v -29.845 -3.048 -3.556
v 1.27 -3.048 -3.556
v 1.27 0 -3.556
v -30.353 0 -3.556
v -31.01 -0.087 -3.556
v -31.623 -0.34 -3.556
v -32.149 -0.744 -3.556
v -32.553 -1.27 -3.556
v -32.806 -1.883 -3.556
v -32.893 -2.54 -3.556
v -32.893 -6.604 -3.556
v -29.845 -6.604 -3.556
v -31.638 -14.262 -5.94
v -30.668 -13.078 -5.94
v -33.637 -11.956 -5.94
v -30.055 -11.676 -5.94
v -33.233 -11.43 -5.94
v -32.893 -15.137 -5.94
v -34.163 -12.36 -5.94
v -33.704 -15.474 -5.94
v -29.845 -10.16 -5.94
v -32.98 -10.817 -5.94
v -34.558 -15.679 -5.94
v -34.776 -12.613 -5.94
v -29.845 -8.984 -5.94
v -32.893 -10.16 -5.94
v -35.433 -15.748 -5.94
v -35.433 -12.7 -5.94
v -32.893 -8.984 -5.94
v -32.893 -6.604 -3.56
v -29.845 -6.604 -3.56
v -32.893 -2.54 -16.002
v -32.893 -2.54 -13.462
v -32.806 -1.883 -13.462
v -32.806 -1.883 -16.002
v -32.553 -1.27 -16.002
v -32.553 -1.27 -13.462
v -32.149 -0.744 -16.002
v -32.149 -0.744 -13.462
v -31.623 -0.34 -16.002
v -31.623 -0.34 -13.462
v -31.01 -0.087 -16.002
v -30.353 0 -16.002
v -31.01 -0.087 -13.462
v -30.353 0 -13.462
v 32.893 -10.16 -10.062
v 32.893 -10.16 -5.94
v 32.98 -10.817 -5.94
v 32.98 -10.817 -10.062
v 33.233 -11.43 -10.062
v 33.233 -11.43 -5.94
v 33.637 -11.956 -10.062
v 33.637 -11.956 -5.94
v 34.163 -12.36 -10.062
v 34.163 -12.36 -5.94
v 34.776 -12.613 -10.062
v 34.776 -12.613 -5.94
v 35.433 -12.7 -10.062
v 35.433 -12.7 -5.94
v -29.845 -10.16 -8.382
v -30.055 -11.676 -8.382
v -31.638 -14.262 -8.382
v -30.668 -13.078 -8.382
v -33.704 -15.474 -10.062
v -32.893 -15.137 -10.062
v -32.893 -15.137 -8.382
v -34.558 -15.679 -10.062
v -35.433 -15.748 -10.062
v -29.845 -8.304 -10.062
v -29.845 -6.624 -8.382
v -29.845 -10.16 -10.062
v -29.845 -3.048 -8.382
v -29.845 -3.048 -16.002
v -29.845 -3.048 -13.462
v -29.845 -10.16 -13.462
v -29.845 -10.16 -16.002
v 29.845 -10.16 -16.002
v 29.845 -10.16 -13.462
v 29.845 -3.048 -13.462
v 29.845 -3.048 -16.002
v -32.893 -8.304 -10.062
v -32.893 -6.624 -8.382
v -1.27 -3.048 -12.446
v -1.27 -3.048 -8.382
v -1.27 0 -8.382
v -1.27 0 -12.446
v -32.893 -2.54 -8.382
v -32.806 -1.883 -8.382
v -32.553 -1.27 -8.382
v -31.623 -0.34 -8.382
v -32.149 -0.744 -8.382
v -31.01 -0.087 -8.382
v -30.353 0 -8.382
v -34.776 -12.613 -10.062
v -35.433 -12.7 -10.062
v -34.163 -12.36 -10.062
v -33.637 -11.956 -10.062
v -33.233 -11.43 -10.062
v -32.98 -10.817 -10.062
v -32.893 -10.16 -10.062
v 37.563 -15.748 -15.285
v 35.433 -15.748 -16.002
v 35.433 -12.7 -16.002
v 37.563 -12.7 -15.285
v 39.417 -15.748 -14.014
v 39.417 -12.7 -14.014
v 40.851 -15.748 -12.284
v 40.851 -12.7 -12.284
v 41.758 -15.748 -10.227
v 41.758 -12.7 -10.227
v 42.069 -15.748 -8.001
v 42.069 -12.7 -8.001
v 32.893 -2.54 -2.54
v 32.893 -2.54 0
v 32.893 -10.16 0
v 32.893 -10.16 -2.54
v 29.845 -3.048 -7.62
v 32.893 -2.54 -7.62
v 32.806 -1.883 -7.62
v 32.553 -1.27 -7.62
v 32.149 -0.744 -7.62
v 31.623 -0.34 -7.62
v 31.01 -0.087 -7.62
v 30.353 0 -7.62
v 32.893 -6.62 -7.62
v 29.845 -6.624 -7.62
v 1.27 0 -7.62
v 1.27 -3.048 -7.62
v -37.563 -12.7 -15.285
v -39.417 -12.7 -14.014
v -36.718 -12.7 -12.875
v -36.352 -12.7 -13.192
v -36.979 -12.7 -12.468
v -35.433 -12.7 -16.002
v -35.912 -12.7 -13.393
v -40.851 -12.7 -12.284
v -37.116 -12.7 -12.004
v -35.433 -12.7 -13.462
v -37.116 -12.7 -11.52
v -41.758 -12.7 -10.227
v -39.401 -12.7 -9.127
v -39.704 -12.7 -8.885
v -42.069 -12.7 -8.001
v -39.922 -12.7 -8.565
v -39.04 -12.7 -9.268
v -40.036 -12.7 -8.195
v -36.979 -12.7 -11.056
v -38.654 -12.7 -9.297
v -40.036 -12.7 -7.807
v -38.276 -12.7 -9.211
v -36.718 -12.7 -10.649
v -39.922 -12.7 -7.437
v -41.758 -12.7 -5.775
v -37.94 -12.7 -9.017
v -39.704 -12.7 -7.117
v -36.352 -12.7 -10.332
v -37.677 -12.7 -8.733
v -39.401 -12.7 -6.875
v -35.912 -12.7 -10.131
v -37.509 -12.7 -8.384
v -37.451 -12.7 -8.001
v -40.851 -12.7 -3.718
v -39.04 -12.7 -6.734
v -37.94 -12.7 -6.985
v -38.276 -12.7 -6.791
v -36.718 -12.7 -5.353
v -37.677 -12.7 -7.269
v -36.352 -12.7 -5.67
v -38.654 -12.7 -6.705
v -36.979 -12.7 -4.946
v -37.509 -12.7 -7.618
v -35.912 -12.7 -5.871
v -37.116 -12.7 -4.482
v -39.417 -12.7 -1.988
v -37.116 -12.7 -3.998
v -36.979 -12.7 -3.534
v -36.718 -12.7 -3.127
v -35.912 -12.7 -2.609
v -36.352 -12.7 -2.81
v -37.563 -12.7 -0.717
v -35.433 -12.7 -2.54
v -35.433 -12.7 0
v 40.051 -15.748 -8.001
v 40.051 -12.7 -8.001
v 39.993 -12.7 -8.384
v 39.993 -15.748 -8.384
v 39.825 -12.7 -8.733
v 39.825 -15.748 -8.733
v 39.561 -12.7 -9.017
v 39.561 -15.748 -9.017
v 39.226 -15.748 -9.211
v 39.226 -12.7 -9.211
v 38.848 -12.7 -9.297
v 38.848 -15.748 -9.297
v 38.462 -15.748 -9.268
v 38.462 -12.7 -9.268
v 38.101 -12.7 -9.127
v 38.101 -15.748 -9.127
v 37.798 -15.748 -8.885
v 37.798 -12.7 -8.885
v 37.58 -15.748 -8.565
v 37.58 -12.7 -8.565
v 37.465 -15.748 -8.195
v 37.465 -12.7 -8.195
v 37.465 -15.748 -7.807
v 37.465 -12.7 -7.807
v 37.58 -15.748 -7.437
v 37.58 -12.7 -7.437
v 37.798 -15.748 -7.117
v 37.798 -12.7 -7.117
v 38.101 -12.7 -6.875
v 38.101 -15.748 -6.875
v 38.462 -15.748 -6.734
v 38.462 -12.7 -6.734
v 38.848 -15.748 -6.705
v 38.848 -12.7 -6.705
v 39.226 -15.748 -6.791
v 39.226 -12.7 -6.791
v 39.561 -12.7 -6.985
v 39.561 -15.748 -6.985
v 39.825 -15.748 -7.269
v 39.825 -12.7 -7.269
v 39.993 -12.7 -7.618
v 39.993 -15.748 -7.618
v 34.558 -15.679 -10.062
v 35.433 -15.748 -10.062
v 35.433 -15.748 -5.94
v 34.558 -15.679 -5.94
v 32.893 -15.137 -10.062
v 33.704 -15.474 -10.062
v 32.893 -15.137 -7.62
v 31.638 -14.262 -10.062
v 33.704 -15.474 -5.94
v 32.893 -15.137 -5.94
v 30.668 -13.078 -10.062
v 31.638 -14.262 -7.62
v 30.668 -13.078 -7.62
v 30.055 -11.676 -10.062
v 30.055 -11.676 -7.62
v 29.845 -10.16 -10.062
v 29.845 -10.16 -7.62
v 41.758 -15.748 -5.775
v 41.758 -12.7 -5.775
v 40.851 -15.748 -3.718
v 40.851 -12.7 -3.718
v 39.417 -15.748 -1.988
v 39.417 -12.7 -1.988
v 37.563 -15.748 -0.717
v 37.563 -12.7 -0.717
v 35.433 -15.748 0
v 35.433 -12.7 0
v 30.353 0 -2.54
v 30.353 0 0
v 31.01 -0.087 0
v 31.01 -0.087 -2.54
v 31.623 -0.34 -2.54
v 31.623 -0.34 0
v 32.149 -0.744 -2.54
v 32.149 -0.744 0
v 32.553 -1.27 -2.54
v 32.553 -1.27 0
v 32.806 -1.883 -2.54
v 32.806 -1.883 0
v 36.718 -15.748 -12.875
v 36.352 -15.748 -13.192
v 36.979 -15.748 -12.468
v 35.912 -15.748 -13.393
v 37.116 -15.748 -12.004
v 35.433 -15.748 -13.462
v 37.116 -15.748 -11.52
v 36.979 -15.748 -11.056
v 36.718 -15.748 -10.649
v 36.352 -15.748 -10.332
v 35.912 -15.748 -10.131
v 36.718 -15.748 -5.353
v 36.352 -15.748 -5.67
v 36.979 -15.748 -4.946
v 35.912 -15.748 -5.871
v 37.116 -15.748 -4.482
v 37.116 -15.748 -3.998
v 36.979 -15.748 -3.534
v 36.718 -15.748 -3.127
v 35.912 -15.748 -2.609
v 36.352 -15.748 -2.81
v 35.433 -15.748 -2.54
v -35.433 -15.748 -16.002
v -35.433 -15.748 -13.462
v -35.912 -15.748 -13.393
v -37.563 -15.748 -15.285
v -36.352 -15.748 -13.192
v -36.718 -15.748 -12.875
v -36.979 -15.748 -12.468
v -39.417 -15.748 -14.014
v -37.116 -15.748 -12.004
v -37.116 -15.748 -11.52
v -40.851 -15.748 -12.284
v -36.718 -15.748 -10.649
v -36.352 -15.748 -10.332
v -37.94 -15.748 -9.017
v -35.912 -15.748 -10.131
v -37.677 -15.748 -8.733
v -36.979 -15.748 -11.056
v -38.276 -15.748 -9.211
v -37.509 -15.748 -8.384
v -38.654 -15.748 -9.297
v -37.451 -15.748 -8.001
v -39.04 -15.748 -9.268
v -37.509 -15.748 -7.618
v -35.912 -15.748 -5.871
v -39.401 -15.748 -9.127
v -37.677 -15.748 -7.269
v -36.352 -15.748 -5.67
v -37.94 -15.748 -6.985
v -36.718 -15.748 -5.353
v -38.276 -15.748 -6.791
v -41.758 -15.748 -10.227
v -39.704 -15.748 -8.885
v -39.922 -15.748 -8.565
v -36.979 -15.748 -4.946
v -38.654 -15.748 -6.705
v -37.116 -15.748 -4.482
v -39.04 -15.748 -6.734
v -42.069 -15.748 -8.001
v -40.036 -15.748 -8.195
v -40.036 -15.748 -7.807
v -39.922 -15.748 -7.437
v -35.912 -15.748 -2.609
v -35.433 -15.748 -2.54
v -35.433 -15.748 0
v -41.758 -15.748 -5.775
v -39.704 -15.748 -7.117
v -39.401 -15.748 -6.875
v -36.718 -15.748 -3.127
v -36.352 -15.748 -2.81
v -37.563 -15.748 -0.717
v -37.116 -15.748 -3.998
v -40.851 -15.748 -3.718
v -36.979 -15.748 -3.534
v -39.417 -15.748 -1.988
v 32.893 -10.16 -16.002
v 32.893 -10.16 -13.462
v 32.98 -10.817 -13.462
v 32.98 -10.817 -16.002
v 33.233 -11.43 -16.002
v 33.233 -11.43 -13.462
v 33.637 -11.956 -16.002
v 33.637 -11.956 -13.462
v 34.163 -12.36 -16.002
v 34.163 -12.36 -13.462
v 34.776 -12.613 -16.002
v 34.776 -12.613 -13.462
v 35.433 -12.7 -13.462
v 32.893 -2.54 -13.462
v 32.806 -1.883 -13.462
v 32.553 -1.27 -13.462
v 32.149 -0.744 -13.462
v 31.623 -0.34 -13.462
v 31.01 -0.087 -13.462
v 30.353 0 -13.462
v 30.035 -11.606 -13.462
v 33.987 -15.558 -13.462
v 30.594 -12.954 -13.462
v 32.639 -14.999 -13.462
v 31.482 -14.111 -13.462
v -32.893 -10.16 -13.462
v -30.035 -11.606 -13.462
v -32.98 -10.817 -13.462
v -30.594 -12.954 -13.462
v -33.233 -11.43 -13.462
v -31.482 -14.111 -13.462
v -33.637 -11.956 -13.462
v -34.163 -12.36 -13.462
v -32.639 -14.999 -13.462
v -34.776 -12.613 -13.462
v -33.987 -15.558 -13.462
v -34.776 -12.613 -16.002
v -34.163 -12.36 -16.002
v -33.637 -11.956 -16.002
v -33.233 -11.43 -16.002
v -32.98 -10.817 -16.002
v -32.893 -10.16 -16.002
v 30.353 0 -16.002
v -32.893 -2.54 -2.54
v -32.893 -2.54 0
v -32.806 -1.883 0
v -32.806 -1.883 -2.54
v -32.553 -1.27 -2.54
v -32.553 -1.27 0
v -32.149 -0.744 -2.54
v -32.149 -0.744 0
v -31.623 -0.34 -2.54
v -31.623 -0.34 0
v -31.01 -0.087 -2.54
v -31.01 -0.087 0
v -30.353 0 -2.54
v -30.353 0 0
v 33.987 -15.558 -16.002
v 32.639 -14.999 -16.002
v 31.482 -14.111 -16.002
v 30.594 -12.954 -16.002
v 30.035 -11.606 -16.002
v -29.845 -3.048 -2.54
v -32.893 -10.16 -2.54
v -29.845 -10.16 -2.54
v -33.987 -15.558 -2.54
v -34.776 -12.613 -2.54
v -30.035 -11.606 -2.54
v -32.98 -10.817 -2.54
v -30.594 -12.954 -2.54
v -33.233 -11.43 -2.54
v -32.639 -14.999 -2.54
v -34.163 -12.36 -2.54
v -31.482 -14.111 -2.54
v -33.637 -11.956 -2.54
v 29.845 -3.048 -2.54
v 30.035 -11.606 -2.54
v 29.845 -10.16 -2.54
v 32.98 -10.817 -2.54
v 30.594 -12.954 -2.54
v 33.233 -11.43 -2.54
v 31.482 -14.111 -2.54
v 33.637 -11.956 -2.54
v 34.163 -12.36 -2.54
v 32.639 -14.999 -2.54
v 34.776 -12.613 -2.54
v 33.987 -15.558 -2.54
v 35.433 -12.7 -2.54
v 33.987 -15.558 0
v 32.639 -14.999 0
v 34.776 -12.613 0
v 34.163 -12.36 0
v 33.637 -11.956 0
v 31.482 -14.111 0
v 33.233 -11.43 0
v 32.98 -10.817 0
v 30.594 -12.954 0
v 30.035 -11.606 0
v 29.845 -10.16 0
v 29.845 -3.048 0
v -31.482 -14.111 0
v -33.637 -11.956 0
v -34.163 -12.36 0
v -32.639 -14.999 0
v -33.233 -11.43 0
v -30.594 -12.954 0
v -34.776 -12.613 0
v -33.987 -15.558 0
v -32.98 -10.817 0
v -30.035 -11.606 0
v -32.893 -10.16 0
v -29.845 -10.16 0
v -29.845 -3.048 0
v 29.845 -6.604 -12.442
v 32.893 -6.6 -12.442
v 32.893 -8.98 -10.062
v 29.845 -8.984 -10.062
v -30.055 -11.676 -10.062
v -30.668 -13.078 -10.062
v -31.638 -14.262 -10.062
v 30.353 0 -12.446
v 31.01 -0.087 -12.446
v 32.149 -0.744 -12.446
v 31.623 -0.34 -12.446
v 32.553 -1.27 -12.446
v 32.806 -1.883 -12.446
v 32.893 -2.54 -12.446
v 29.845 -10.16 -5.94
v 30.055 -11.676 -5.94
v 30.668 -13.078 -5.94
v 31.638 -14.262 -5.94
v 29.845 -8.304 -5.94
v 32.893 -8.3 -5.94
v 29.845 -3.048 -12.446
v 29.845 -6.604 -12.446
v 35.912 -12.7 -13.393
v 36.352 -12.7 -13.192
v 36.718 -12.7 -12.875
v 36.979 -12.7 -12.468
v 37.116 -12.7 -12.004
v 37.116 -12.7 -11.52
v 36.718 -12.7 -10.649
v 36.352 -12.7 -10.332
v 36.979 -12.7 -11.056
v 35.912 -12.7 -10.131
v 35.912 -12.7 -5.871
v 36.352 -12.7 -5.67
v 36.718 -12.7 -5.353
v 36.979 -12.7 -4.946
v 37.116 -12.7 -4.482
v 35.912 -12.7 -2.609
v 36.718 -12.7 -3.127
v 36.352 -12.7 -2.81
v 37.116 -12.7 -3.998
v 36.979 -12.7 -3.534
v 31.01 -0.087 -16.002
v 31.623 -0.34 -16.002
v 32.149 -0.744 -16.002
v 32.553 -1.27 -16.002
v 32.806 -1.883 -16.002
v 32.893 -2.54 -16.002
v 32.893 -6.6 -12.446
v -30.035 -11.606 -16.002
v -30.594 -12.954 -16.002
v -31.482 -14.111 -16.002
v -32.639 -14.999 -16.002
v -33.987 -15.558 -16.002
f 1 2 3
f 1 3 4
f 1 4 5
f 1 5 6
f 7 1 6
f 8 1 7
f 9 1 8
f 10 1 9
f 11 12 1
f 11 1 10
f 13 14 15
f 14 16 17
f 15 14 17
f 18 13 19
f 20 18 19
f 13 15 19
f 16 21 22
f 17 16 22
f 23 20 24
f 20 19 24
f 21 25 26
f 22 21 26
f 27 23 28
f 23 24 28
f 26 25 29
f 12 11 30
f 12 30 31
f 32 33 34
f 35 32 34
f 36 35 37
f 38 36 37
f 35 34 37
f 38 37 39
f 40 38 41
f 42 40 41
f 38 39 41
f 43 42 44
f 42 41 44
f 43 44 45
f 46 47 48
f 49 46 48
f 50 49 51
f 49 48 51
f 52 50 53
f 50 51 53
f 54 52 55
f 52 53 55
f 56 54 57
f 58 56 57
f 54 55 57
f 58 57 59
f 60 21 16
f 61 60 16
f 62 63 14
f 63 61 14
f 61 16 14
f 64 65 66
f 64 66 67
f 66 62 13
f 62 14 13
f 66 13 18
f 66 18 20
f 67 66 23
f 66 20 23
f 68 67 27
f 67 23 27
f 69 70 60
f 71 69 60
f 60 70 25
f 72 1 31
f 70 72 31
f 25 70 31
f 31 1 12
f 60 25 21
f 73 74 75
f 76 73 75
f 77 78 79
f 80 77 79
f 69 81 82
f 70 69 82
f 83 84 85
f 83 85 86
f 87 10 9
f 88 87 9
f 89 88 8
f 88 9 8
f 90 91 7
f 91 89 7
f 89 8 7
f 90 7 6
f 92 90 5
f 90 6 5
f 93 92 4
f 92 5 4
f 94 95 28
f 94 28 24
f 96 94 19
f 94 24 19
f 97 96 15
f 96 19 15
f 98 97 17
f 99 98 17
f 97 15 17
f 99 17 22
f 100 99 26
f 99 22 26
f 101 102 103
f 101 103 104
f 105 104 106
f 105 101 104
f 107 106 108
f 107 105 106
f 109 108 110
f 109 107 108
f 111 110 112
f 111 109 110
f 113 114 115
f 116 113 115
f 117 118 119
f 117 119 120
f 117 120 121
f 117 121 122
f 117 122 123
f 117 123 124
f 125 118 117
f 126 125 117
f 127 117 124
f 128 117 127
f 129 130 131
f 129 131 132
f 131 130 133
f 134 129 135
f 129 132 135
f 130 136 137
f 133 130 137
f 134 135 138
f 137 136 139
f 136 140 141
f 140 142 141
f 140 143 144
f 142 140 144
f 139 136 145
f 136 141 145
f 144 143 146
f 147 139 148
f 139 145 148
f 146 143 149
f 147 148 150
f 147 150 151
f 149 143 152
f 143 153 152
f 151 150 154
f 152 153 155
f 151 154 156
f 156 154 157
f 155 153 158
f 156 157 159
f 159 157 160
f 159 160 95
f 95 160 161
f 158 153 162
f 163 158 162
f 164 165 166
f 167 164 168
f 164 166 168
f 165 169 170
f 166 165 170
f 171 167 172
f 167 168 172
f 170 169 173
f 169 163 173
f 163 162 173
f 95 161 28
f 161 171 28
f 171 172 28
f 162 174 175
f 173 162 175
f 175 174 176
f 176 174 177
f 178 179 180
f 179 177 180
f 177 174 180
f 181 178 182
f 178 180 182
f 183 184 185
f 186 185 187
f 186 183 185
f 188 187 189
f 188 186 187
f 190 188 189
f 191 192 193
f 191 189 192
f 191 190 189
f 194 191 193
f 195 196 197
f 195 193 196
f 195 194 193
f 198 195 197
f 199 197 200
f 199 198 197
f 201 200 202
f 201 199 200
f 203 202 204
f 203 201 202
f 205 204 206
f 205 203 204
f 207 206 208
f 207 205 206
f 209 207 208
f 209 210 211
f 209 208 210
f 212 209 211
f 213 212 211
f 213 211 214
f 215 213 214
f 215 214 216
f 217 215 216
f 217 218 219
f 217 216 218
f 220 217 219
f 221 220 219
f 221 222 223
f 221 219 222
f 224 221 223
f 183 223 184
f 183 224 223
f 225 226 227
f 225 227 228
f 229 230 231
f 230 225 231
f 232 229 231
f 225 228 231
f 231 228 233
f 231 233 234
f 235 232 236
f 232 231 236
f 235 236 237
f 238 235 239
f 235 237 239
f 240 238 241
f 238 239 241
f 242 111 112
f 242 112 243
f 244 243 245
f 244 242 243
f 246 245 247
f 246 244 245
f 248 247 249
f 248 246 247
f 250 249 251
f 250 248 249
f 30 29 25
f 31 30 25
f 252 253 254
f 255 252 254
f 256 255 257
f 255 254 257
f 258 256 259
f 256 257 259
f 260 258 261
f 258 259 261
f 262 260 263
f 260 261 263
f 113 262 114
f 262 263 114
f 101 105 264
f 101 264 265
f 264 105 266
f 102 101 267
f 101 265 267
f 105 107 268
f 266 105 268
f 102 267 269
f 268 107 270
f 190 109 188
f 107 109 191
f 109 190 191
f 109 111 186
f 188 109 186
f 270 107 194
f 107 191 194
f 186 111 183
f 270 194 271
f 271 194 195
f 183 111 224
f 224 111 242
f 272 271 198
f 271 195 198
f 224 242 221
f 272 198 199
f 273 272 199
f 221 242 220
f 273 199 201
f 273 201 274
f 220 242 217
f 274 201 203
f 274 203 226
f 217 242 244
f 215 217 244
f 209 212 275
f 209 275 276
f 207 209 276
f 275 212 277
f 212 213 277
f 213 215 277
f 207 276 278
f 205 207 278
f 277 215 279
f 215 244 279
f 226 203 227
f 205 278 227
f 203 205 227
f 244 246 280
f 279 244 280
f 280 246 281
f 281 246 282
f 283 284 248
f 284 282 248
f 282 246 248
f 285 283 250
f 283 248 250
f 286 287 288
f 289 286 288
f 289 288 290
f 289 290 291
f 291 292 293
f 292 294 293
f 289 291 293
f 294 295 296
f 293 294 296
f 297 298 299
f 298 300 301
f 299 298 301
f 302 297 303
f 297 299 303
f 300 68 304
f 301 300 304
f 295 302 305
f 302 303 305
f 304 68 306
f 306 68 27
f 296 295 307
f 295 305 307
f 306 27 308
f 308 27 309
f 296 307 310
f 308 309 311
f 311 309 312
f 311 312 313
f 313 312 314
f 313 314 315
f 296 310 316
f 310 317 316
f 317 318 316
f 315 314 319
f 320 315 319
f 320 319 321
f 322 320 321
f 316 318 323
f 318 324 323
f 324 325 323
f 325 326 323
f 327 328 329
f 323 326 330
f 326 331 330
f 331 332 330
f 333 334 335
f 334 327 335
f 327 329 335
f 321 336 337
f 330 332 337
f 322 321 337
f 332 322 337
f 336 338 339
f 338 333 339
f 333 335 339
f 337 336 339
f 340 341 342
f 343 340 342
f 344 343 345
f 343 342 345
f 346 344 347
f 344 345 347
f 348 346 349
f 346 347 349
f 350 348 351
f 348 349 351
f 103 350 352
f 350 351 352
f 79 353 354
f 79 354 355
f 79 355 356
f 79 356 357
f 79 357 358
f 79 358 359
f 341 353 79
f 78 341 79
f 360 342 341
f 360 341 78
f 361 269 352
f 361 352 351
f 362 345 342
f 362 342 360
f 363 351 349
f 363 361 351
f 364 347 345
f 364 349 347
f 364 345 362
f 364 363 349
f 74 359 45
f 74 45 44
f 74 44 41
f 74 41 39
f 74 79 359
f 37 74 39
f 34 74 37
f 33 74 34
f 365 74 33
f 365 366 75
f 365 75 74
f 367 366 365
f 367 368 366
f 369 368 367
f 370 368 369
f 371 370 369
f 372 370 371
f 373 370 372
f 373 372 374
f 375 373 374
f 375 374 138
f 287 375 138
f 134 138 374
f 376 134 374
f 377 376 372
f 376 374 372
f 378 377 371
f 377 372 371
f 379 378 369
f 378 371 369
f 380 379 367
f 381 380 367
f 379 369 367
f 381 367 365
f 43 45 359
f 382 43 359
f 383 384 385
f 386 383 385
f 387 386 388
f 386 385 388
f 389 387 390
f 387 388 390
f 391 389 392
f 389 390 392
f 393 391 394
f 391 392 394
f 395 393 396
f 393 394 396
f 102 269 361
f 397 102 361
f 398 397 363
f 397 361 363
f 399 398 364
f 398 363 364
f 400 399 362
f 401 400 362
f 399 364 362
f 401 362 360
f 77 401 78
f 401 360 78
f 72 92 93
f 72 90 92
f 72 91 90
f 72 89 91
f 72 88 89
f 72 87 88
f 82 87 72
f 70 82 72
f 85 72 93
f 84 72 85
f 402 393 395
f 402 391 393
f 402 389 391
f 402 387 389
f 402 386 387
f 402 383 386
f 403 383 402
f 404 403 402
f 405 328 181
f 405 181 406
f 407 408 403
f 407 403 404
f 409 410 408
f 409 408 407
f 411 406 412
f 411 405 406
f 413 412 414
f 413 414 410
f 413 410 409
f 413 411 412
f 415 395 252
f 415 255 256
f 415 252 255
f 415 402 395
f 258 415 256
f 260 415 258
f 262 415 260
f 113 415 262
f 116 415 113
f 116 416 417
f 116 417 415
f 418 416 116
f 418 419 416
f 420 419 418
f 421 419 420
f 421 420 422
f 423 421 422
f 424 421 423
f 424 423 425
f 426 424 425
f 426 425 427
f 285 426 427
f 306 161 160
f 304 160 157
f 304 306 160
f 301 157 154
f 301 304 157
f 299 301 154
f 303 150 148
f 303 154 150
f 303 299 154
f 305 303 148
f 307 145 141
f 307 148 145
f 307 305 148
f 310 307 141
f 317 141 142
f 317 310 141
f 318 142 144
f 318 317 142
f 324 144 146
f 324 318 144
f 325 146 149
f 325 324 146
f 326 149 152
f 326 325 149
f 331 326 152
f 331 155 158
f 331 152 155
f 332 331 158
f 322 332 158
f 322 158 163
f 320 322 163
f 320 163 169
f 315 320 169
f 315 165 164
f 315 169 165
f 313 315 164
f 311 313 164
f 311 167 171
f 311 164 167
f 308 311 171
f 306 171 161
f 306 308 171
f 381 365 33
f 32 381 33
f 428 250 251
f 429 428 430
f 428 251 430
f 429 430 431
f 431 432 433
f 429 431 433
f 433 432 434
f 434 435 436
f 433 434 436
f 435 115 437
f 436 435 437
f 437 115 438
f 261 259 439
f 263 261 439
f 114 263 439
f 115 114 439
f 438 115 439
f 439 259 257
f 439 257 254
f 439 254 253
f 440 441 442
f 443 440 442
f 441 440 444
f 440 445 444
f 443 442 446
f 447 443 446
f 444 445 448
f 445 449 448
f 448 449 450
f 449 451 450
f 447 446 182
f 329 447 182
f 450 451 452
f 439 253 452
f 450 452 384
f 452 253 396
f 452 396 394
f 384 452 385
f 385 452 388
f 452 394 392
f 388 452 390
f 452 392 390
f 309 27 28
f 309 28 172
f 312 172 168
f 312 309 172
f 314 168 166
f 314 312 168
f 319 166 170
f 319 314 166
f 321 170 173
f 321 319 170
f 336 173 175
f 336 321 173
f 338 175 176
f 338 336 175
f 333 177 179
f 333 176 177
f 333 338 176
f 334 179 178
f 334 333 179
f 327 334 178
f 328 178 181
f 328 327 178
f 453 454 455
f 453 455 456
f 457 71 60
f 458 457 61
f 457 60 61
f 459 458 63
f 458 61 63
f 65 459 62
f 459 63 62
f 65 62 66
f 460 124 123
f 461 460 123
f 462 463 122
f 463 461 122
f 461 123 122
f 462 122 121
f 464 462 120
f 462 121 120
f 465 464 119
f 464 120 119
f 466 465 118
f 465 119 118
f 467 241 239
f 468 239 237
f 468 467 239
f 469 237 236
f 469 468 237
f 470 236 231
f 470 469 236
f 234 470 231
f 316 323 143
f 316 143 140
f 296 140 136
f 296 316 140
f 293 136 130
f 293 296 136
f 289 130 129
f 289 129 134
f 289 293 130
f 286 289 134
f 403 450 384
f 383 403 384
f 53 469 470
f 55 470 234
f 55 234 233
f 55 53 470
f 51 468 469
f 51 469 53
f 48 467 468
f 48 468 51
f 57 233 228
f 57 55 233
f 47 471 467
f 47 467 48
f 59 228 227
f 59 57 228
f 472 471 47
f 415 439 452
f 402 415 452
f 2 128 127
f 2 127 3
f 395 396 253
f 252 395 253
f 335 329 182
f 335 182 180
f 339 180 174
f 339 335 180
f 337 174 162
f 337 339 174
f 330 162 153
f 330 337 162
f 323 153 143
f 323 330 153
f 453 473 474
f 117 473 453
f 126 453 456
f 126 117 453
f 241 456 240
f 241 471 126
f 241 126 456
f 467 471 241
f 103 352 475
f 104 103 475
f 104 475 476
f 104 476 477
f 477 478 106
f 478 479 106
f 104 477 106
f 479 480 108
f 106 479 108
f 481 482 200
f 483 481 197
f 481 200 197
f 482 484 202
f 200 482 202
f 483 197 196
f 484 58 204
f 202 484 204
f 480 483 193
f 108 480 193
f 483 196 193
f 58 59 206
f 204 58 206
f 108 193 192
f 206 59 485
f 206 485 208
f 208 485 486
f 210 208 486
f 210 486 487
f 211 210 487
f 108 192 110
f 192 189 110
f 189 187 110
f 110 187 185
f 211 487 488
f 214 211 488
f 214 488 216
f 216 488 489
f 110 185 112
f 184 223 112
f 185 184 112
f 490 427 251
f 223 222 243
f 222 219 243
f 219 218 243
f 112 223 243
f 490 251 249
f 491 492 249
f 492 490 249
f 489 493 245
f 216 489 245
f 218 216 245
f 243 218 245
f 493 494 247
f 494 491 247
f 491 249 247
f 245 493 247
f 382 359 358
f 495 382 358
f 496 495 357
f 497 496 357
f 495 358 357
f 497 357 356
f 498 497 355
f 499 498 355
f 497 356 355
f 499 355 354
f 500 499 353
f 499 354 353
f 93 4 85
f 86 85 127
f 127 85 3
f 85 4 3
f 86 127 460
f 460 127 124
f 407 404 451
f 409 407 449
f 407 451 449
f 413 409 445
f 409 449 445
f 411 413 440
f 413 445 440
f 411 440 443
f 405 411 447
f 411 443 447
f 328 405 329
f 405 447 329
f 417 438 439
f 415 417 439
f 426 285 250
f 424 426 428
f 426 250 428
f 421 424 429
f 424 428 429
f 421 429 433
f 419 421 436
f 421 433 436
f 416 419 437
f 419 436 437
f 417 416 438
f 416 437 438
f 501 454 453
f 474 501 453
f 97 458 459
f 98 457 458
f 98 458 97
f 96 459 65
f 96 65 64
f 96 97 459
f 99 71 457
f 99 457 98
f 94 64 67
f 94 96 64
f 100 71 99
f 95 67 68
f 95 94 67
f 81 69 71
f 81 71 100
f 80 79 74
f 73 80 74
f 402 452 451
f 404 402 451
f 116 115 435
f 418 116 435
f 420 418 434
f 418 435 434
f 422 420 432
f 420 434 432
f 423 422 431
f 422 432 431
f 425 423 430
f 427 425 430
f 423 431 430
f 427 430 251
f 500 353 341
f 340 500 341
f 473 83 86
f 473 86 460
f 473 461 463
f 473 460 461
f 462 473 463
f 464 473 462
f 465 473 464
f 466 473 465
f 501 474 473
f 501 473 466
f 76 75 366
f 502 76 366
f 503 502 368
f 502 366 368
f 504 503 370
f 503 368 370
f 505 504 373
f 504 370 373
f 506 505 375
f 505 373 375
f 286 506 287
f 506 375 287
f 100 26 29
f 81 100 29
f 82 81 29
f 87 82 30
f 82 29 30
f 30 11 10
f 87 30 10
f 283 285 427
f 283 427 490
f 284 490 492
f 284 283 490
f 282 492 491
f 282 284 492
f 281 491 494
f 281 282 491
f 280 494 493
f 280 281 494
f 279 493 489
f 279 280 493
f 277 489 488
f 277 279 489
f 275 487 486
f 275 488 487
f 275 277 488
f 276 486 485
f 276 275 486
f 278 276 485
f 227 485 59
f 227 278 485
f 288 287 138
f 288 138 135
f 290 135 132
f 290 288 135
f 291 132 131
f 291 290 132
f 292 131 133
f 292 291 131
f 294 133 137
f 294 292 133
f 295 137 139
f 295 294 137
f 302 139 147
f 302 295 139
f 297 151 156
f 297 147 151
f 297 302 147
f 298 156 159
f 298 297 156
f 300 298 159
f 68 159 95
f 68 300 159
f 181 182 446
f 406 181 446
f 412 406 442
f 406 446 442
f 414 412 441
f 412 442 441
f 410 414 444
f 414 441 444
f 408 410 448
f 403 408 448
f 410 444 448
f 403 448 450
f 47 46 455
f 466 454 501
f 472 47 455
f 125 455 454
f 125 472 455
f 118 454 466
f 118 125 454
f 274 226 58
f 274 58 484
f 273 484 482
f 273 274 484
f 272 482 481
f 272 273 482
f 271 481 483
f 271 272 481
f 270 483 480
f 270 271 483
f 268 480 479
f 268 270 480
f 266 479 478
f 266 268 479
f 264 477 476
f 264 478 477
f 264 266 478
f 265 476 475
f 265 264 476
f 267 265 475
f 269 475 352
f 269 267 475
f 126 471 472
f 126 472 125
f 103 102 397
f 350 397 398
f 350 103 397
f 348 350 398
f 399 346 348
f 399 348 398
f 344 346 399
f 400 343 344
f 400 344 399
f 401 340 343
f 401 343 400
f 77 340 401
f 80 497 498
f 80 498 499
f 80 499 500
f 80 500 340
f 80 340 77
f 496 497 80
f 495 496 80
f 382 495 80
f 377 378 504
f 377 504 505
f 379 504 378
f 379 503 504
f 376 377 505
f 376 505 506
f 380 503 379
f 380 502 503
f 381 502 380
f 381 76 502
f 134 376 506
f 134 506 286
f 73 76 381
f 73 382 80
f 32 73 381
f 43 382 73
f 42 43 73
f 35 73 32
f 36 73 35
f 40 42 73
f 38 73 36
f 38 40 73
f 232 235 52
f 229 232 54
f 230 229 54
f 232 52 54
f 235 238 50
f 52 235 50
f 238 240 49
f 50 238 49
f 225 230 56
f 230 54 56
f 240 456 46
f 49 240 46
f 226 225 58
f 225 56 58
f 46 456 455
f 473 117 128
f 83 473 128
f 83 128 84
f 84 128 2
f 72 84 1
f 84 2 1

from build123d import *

# Parameters (mm, degrees)
EXTRUDE_THIN1_DEPTH    = 16.002
CUT_EXTRUDE1_START     = -15.748
CUT_EXTRUDE1_OUTLINE_R = 1.3
CUT_EXTRUDE1_DEPTH     = 15.748
BOSS_EXTRUDE2_DEPTH    = 1.68
BOSS_EXTRUDE3_START    = 1.68
BOSS_EXTRUDE3_DEPTH    = 1.68
CUT_EXTRUDE2_START     = -2.384
CUT_EXTRUDE2_DEPTH     = 2.384
CUT_EXTRUDE3_DEPTH     = 2.384
CHAMFER1_SIZE          = 1.7
CHAMFER2_SIZE          = 2.38


# Read off the part's stored shape, not the designer's step: Cut-Extrude1
with BuildPart() as part:
    # Sketch1 → Extrude-Thin1 (new body)
    with BuildSketch(Plane.XY):
        with BuildLine():
            Line((-42.06875, -12.7), (-35.433, -12.7))
            ThreePointArc((-35.433, -12.7), (-33.636948776, -11.956051224), (-32.893, -10.16))
            Line((-32.893, -10.16), (-32.893, -2.54))
            ThreePointArc((-32.893, -2.54), (-32.149051224, -0.743948776), (-30.353, 0))
            Line((-30.353, 0), (30.353, 0))
            ThreePointArc((30.353, 0), (32.149051224, -0.743948776), (32.893, -2.54))
            Line((32.893, -2.54), (32.893, -10.16))
            ThreePointArc((32.893, -10.16), (33.636948776, -11.956051224), (35.433, -12.7))
            Line((35.433, -12.7), (42.06875, -12.7))
            Line((42.06875, -12.7), (42.06875, -15.748))
            Line((42.06875, -15.748), (35.433, -15.748))
            ThreePointArc((35.433, -15.748), (31.481687307, -14.111312693), (29.845, -10.16))
            Line((29.845, -10.16), (29.845, -3.048))
            Line((29.845, -3.048), (-29.845, -3.048))
            Line((-29.845, -3.048), (-29.845, -10.16))
            ThreePointArc((-29.845, -10.16), (-31.481687307, -14.111312693), (-35.433, -15.748))
            Line((-35.433, -15.748), (-42.06875, -15.748))
            Line((-42.06875, -15.748), (-42.06875, -12.7))
        make_face()
    extrude(amount=-EXTRUDE_THIN1_DEPTH)

    # Cut-Extrude1 outline → Cut-Extrude1 (cut)
    with BuildSketch(Plane(origin=(0, 0, 0), x_dir=(1, 0, 0), z_dir=(0, 1, 0)).offset(CUT_EXTRUDE1_START)):
        with BuildLine():
            Line((35.433, 13.462), (-35.433, 13.462))
            ThreePointArc((-35.433, 13.462), (-37.133, 11.762), (-35.433, 10.062))
            Line((-35.433, 10.062), (-32.893, 10.062))
            Line((-32.893, 10.062), (-32.893, 8.382))
            Line((-32.893, 8.382), (-1.27, 8.382))
            Line((-1.27, 8.382), (-1.27, 12.446))
            Line((-1.27, 12.446), (32.893, 12.446))
            Line((32.893, 12.446), (32.893, 10.062))
            Line((32.893, 10.062), (35.433, 10.062))
            ThreePointArc((35.433, 10.062), (37.133, 11.762), (35.433, 13.462))
        make_face()
        with BuildLine():
            Line((32.893, 5.94), (32.893, 7.62))
            Line((32.893, 7.62), (1.27, 7.62))
            Line((1.27, 7.62), (1.27, 3.556))
            Line((1.27, 3.556), (-32.893, 3.556))
            Line((-32.893, 3.556), (-32.893, 5.94))
            Line((-32.893, 5.94), (-35.433, 5.94))
            ThreePointArc((-35.433, 5.94), (-37.133, 4.24), (-35.433, 2.54))
            Line((-35.433, 2.54), (35.433, 2.54))
            ThreePointArc((35.433, 2.54), (37.133, 4.24), (35.433, 5.94))
            Line((35.433, 5.94), (32.893, 5.94))
        make_face()
        with BuildLine():
            Line((42.06875, 16.002), (35.433, 16.002))
            ThreePointArc((35.433, 16.002), (40.193949205, 13.198335352), (42.06875, 8.001))
            Line((42.06875, 8.001), (42.06875, 16.002))
        make_face()
        with BuildLine():
            Line((42.06875, 0), (42.06875, 8.001))
            ThreePointArc((42.06875, 8.001), (40.193949205, 2.803664648), (35.433, 0))
            Line((35.433, 0), (42.06875, 0))
        make_face()
        with BuildLine():
            ThreePointArc((-42.06875, 8.001), (-40.193949205, 13.198335352), (-35.433, 16.002))
            Line((-35.433, 16.002), (-42.06875, 16.002))
            Line((-42.06875, 16.002), (-42.06875, 8.001))
        make_face()
        with BuildLine():
            ThreePointArc((-35.433, 0), (-40.193949205, 2.803664648), (-42.06875, 8.001))
            Line((-42.06875, 8.001), (-42.06875, 0))
            Line((-42.06875, 0), (-35.433, 0))
        make_face()
        with Locations((38.750875, 8.001)):
            Circle(CUT_EXTRUDE1_OUTLINE_R)
        with Locations((-38.750875, 8.001)):
            Circle(CUT_EXTRUDE1_OUTLINE_R)
    extrude(amount=CUT_EXTRUDE1_DEPTH, mode=Mode.SUBTRACT)

    # Sketch6 → Boss-Extrude2 (add)
    with BuildSketch(Plane(origin=(0, 0, -8.382), x_dir=(-1, 0, 0), z_dir=(0, 0, -1))):
        with BuildLine():
            Line((32.893, -10.16), (32.893, -6.604))
            Line((32.893, -6.604), (29.845, -6.604))
            Line((29.845, -6.604), (29.845, -10.16))
            ThreePointArc((29.845, -10.16), (30.667537588, -13.078237824), (32.893, -15.137363157))
            Line((32.893, -15.137363157), (32.893, -10.16))
        make_face()
    extrude(amount=BOSS_EXTRUDE2_DEPTH)

    # Sketch7 → Boss-Extrude3 (add)
    with BuildSketch(Plane.XY.offset(-7.62).offset(BOSS_EXTRUDE3_START)):
        with BuildLine():
            Line((32.893, -10.16), (32.893, -6.6))
            Line((32.893, -6.6), (29.845, -6.604))
            Line((29.845, -6.604), (29.845, -10.16))
            ThreePointArc((29.845, -10.16), (30.667537588, -13.078237824), (32.893, -15.137363157))
            Line((32.893, -15.137363157), (32.893, -10.16))
        make_face()
    extrude(amount=-BOSS_EXTRUDE3_DEPTH)

    # Sketch8 → Cut-Extrude2 (cut)
    with BuildSketch(Plane(origin=(0, 0, -12.446), x_dir=(-1, 0, 0), z_dir=(0, 0, -1)).offset(CUT_EXTRUDE2_START)):
        with BuildLine():
            Line((-32.893, -15.137363157), (-32.893, -6.6))
            Line((-32.893, -6.6), (-29.845, -6.604))
            Line((-29.845, -6.604), (-29.845, -10.16))
            ThreePointArc((-29.845, -10.16), (-30.667537588, -13.078237824), (-32.893, -15.137363157))
        make_face()
    extrude(amount=CUT_EXTRUDE2_DEPTH, mode=Mode.SUBTRACT)

    # Sketch9 → Cut-Extrude3 (cut)
    with BuildSketch(Plane.XY.offset(-3.556)):
        with BuildLine():
            Line((-32.893, -15.137363157), (-32.893, -6.604))
            Line((-32.893, -6.604), (-29.845, -6.604))
            Line((-29.845, -6.604), (-29.845, -10.16))
            ThreePointArc((-29.845, -10.16), (-30.667537588, -13.078237824), (-32.893, -15.137363157))
        make_face()
    extrude(amount=-CUT_EXTRUDE3_DEPTH, mode=Mode.SUBTRACT)

    # Chamfer1
    # the kernel refuses this chamfer: 1.7 mm, written as the material it adds along each edge
    # the kernel refuses this chamfer: 1.7 mm, written as the material it takes off along each edge
    with BuildSketch(Plane(origin=(-37.26486108, -6.604, -10.062), x_dir=(0, -0.9996219169112968, -0.02749587661058687), z_dir=(1, 0, 0))) as chamfer1_2_piece_1_section:
        Polygon((CHAMFER1_SIZE * 0.999621916911, -CHAMFER1_SIZE * 0.0274958766106), (-CHAMFER1_SIZE * 0.0274958766106, -CHAMFER1_SIZE * 0.999621916911), (0, 0), align=None)
    chamfer1_2_piece_1 = extrude(amount=11.791722159, mode=Mode.PRIVATE)
    chamfer1_2_piece_1 = split(chamfer1_2_piece_1, bisect_by=Plane(origin=(-31.369, -7.170744186, -8.382), z_dir=(0, 0, -1)), keep=Keep.TOP, mode=Mode.PRIVATE)
    add(chamfer1_2_piece_1, mode=Mode.SUBTRACT)
    with BuildSketch(Plane(origin=(37.264857315, -6.594262654, -5.94), x_dir=(0.00131183865632537, -0.9996210561251475, 0.02749587661058631), z_dir=(-0.999999138888279, -0.0013123348279305267, 0))) as chamfer1_2_piece_2_section:
        Polygon((CHAMFER1_SIZE * 0.999621916911, -CHAMFER1_SIZE * 0.0274958766106), (-CHAMFER1_SIZE * 0.0274958766106, -CHAMFER1_SIZE * 0.999621916911), (0, 0), align=None)
    chamfer1_2_piece_2 = extrude(amount=11.791724784, mode=Mode.PRIVATE)
    chamfer1_2_piece_2 = split(chamfer1_2_piece_2, bisect_by=Plane(origin=(31.369, -7.168744674, -7.62), z_dir=(0, 0, 1)), keep=Keep.TOP, mode=Mode.PRIVATE)
    add(chamfer1_2_piece_2, mode=Mode.SUBTRACT)

    # Chamfer2
    chamfer2_edges = [part.edges().sort_by_distance(p)[0] for p in [
        (31.369, -6.602, -10.062),
        (-31.369, -6.604, -5.94),
    ]]
    chamfer(chamfer2_edges, length=CHAMFER2_SIZE)


solid = part.part
